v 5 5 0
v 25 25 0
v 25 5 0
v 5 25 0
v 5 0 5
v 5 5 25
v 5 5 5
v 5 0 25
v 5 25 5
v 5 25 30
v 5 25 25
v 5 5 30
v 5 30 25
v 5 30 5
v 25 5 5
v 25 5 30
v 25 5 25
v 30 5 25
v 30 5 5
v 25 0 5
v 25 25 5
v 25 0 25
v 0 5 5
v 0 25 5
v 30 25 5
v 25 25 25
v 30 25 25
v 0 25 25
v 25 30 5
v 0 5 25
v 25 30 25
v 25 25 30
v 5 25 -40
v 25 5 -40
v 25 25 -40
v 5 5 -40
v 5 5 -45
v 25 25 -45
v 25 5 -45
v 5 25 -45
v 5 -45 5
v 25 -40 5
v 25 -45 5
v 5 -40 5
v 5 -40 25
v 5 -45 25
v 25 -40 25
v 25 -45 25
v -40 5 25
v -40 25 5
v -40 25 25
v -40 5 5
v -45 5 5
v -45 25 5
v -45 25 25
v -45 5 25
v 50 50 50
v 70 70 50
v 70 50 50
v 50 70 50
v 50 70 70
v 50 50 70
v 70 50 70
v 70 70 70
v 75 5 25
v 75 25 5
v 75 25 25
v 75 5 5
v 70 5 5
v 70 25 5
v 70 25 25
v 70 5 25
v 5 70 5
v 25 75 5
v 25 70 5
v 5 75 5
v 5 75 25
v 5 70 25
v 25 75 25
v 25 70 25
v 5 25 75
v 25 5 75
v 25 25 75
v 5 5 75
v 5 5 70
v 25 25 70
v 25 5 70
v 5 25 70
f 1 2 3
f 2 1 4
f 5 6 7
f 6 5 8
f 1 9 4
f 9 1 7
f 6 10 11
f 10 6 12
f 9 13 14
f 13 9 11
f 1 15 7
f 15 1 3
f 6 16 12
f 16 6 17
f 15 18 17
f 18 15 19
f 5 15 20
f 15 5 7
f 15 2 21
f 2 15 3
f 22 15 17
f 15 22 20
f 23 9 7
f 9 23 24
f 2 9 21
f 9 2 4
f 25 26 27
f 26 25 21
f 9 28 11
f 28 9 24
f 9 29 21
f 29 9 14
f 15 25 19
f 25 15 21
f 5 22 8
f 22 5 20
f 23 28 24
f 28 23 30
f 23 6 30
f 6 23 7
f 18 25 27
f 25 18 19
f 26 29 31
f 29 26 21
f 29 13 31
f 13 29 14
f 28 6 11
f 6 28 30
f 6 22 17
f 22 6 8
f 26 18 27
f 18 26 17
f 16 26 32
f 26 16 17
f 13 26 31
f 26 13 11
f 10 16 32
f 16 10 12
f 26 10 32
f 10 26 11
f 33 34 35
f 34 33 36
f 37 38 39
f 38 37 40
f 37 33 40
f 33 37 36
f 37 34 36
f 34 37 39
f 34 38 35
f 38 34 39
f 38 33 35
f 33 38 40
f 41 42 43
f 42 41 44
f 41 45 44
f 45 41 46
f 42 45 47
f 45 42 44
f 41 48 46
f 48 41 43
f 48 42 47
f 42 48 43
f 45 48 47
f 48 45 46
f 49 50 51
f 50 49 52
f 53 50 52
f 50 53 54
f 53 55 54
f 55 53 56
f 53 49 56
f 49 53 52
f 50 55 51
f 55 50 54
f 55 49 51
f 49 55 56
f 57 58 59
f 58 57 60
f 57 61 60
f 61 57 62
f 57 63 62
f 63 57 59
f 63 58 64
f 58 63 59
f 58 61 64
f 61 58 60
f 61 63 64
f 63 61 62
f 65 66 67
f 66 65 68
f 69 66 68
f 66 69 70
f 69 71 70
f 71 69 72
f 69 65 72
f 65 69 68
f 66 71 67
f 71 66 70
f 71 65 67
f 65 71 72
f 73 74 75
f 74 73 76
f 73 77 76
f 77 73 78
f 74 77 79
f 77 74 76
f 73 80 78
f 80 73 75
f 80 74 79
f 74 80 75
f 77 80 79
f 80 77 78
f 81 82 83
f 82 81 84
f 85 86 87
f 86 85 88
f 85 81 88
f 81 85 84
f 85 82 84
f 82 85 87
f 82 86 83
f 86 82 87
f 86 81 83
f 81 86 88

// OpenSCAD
// SCAD file for Six Piece Burr Puzzle
// 整体模型
union() {
  translate([5, 5, 0]) color([1, 0.8, 0, 0.85]) cube([5, 5, 5]);
  translate([10, 5, 0]) color([1, 0.8, 0, 0.85]) cube([5, 5, 5]);
  translate([15, 5, 0]) color([1, 0.8, 0, 0.85]) cube([5, 5, 5]);
  translate([20, 5, 0]) color([1, 0.8, 0, 0.85]) cube([5, 5, 5]);
  translate([5, 10, 0]) color([1, 0.8, 0, 0.85]) cube([5, 5, 5]);
  translate([10, 10, 0]) color([1, 0.8, 0, 0.85]) cube([5, 5, 5]);
  translate([15, 10, 0]) color([1, 0.8, 0, 0.85]) cube([5, 5, 5]);
  translate([20, 10, 0]) color([1, 0.8, 0, 0.85]) cube([5, 5, 5]);
  translate([5, 15, 0]) color([1, 0.8, 0, 0.85]) cube([5, 5, 5]);
  translate([10, 15, 0]) color([1, 0.8, 0, 0.85]) cube([5, 5, 5]);
  translate([15, 15, 0]) color([1, 0.8, 0, 0.85]) cube([5, 5, 5]);
  translate([20, 15, 0]) color([1, 0.8, 0, 0.85]) cube([5, 5, 5]);
  translate([5, 20, 0]) color([1, 0.8, 0, 0.85]) cube([5, 5, 5]);
  translate([10, 20, 0]) color([1, 0.8, 0, 0.85]) cube([5, 5, 5]);
  translate([15, 20, 0]) color([1, 0.8, 0, 0.85]) cube([5, 5, 5]);
  translate([20, 20, 0]) color([1, 0.8, 0, 0.85]) cube([5, 5, 5]);
  translate([5, 0, 5]) color([0, 0.8, 0, 0.85]) cube([5, 5, 5]);
  translate([10, 0, 5]) color([0, 0.8, 0, 0.85]) cube([5, 5, 5]);
  translate([15, 0, 5]) color([0, 0.8, 0, 0.85]) cube([5, 5, 5]);
  translate([20, 0, 5]) color([0, 0.8, 0, 0.85]) cube([5, 5, 5]);
  translate([0, 5, 5]) color([0.6, 0, 1, 0.85]) cube([5, 5, 5]);
  translate([5, 5, 5]) color([0.8, 0.8, 0.8, 0.85]) cube([5, 5, 5]);
  translate([10, 5, 5]) color([0.8, 0.8, 0.8, 0.85]) cube([5, 5, 5]);
  translate([15, 5, 5]) color([0.8, 0.8, 0.8, 0.85]) cube([5, 5, 5]);
  translate([20, 5, 5]) color([0.8, 0.8, 0.8, 0.85]) cube([5, 5, 5]);
  translate([25, 5, 5]) color([1, 0.4, 0, 0.85]) cube([5, 5, 5]);
  translate([0, 10, 5]) color([0.6, 0, 1, 0.85]) cube([5, 5, 5]);
  translate([5, 10, 5]) color([0.8, 0.8, 0.8, 0.85]) cube([5, 5, 5]);
  translate([10, 10, 5]) color([0.8, 0.8, 0.8, 0.85]) cube([5, 5, 5]);
  translate([15, 10, 5]) color([0.8, 0.8, 0.8, 0.85]) cube([5, 5, 5]);
  translate([20, 10, 5]) color([0.8, 0.8, 0.8, 0.85]) cube([5, 5, 5]);
  translate([25, 10, 5]) color([1, 0.4, 0, 0.85]) cube([5, 5, 5]);
  translate([0, 15, 5]) color([0.6, 0, 1, 0.85]) cube([5, 5, 5]);
  translate([5, 15, 5]) color([0.8, 0.8, 0.8, 0.85]) cube([5, 5, 5]);
  translate([10, 15, 5]) color([0.8, 0.8, 0.8, 0.85]) cube([5, 5, 5]);
  translate([15, 15, 5]) color([0.8, 0.8, 0.8, 0.85]) cube([5, 5, 5]);
  translate([20, 15, 5]) color([0.8, 0.8, 0.8, 0.85]) cube([5, 5, 5]);
  translate([25, 15, 5]) color([1, 0.4, 0, 0.85]) cube([5, 5, 5]);
  translate([0, 20, 5]) color([0.6, 0, 1, 0.85]) cube([5, 5, 5]);
  translate([5, 20, 5]) color([0.8, 0.8, 0.8, 0.85]) cube([5, 5, 5]);
  translate([10, 20, 5]) color([0.8, 0.8, 0.8, 0.85]) cube([5, 5, 5]);
  translate([15, 20, 5]) color([0.8, 0.8, 0.8, 0.85]) cube([5, 5, 5]);
  translate([20, 20, 5]) color([0.8, 0.8, 0.8, 0.85]) cube([5, 5, 5]);
  translate([25, 20, 5]) color([1, 0.4, 0, 0.85]) cube([5, 5, 5]);
  translate([5, 25, 5]) color([1, 0, 0, 0.85]) cube([5, 5, 5]);
  translate([10, 25, 5]) color([1, 0, 0, 0.85]) cube([5, 5, 5]);
  translate([15, 25, 5]) color([1, 0, 0, 0.85]) cube([5, 5, 5]);
  translate([20, 25, 5]) color([1, 0, 0, 0.85]) cube([5, 5, 5]);
  translate([5, 0, 10]) color([0, 0.8, 0, 0.85]) cube([5, 5, 5]);
  translate([10, 0, 10]) color([0, 0.8, 0, 0.85]) cube([5, 5, 5]);
  translate([15, 0, 10]) color([0, 0.8, 0, 0.85]) cube([5, 5, 5]);
  translate([20, 0, 10]) color([0, 0.8, 0, 0.85]) cube([5, 5, 5]);
  translate([0, 5, 10]) color([0.6, 0, 1, 0.85]) cube([5, 5, 5]);
  translate([5, 5, 10]) color([0.8, 0.8, 0.8, 0.85]) cube([5, 5, 5]);
  translate([10, 5, 10]) color([0.8, 0.8, 0.8, 0.85]) cube([5, 5, 5]);
  translate([15, 5, 10]) color([0.8, 0.8, 0.8, 0.85]) cube([5, 5, 5]);
  translate([20, 5, 10]) color([0.8, 0.8, 0.8, 0.85]) cube([5, 5, 5]);
  translate([25, 5, 10]) color([1, 0.4, 0, 0.85]) cube([5, 5, 5]);
  translate([0, 10, 10]) color([0.6, 0, 1, 0.85]) cube([5, 5, 5]);
  translate([5, 10, 10]) color([0.8, 0.8, 0.8, 0.85]) cube([5, 5, 5]);
  translate([10, 10, 10]) color([0.8, 0.8, 0.8, 0.85]) cube([5, 5, 5]);
  translate([15, 10, 10]) color([0.8, 0.8, 0.8, 0.85]) cube([5, 5, 5]);
  translate([20, 10, 10]) color([0.8, 0.8, 0.8, 0.85]) cube([5, 5, 5]);
  translate([25, 10, 10]) color([1, 0.4, 0, 0.85]) cube([5, 5, 5]);
  translate([0, 15, 10]) color([0.6, 0, 1, 0.85]) cube([5, 5, 5]);
  translate([5, 15, 10]) color([0.8, 0.8, 0.8, 0.85]) cube([5, 5, 5]);
  translate([10, 15, 10]) color([0.8, 0.8, 0.8, 0.85]) cube([5, 5, 5]);
  translate([15, 15, 10]) color([0.8, 0.8, 0.8, 0.85]) cube([5, 5, 5]);
  translate([20, 15, 10]) color([0.8, 0.8, 0.8, 0.85]) cube([5, 5, 5]);
  translate([25, 15, 10]) color([1, 0.4, 0, 0.85]) cube([5, 5, 5]);
  translate([0, 20, 10]) color([0.6, 0, 1, 0.85]) cube([5, 5, 5]);
  translate([5, 20, 10]) color([0.8, 0.8, 0.8, 0.85]) cube([5, 5, 5]);
  translate([10, 20, 10]) color([0.8, 0.8, 0.8, 0.85]) cube([5, 5, 5]);
  translate([15, 20, 10]) color([0.8, 0.8, 0.8, 0.85]) cube([5, 5, 5]);
  translate([20, 20, 10]) color([0.8, 0.8, 0.8, 0.85]) cube([5, 5, 5]);
  translate([25, 20, 10]) color([1, 0.4, 0, 0.85]) cube([5, 5, 5]);
  translate([5, 25, 10]) color([1, 0, 0, 0.85]) cube([5, 5, 5]);
  translate([10, 25, 10]) color([1, 0, 0, 0.85]) cube([5, 5, 5]);
  translate([15, 25, 10]) color([1, 0, 0, 0.85]) cube([5, 5, 5]);
  translate([20, 25, 10]) color([1, 0, 0, 0.85]) cube([5, 5, 5]);
  translate([5, 0, 15]) color([0, 0.8, 0, 0.85]) cube([5, 5, 5]);
  translate([10, 0, 15]) color([0, 0.8, 0, 0.85]) cube([5, 5, 5]);
  translate([15, 0, 15]) color([0, 0.8, 0, 0.85]) cube([5, 5, 5]);
  translate([20, 0, 15]) color([0, 0.8, 0, 0.85]) cube([5, 5, 5]);
  translate([0, 5, 15]) color([0.6, 0, 1, 0.85]) cube([5, 5, 5]);
  translate([5, 5, 15]) color([0.8, 0.8, 0.8, 0.85]) cube([5, 5, 5]);
  translate([10, 5, 15]) color([0.8, 0.8, 0.8, 0.85]) cube([5, 5, 5]);
  translate([15, 5, 15]) color([0.8, 0.8, 0.8, 0.85]) cube([5, 5, 5]);
  translate([20, 5, 15]) color([0.8, 0.8, 0.8, 0.85]) cube([5, 5, 5]);
  translate([25, 5, 15]) color([1, 0.4, 0, 0.85]) cube([5, 5, 5]);
  translate([0, 10, 15]) color([0.6, 0, 1, 0.85]) cube([5, 5, 5]);
  translate([5, 10, 15]) color([0.8, 0.8, 0.8, 0.85]) cube([5, 5, 5]);
  translate([10, 10, 15]) color([0.8, 0.8, 0.8, 0.85]) cube([5, 5, 5]);
  translate([15, 10, 15]) color([0.8, 0.8, 0.8, 0.85]) cube([5, 5, 5]);
  translate([20, 10, 15]) color([0.8, 0.8, 0.8, 0.85]) cube([5, 5, 5]);
  translate([25, 10, 15]) color([1, 0.4, 0, 0.85]) cube([5, 5, 5]);
  translate([0, 15, 15]) color([0.6, 0, 1, 0.85]) cube([5, 5, 5]);
  translate([5, 15, 15]) color([0.8, 0.8, 0.8, 0.85]) cube([5, 5, 5]);
  translate([10, 15, 15]) color([0.8, 0.8, 0.8, 0.85]) cube([5, 5, 5]);
  translate([15, 15, 15]) color([0.8, 0.8, 0.8, 0.85]) cube([5, 5, 5]);
  translate([20, 15, 15]) color([0.8, 0.8, 0.8, 0.85]) cube([5, 5, 5]);
  translate([25, 15, 15]) color([1, 0.4, 0, 0.85]) cube([5, 5, 5]);
  translate([0, 20, 15]) color([0.6, 0, 1, 0.85]) cube([5, 5, 5]);
  translate([5, 20, 15]) color([0.8, 0.8, 0.8, 0.85]) cube([5, 5, 5]);
  translate([10, 20, 15]) color([0.8, 0.8, 0.8, 0.85]) cube([5, 5, 5]);
  translate([15, 20, 15]) color([0.8, 0.8, 0.8, 0.85]) cube([5, 5, 5]);
  translate([20, 20, 15]) color([0.8, 0.8, 0.8, 0.85]) cube([5, 5, 5]);
  translate([25, 20, 15]) color([1, 0.4, 0, 0.85]) cube([5, 5, 5]);
  translate([5, 25, 15]) color([1, 0, 0, 0.85]) cube([5, 5, 5]);
  translate([10, 25, 15]) color([1, 0, 0, 0.85]) cube([5, 5, 5]);
  translate([15, 25, 15]) color([1, 0, 0, 0.85]) cube([5, 5, 5]);
  translate([20, 25, 15]) color([1, 0, 0, 0.85]) cube([5, 5, 5]);
  translate([5, 0, 20]) color([0, 0.8, 0, 0.85]) cube([5, 5, 5]);
  translate([10, 0, 20]) color([0, 0.8, 0, 0.85]) cube([5, 5, 5]);
  translate([15, 0, 20]) color([0, 0.8, 0, 0.85]) cube([5, 5, 5]);
  translate([20, 0, 20]) color([0, 0.8, 0, 0.85]) cube([5, 5, 5]);
  translate([0, 5, 20]) color([0.6, 0, 1, 0.85]) cube([5, 5, 5]);
  translate([5, 5, 20]) color([0.8, 0.8, 0.8, 0.85]) cube([5, 5, 5]);
  translate([10, 5, 20]) color([0.8, 0.8, 0.8, 0.85]) cube([5, 5, 5]);
  translate([15, 5, 20]) color([0.8, 0.8, 0.8, 0.85]) cube([5, 5, 5]);
  translate([20, 5, 20]) color([0.8, 0.8, 0.8, 0.85]) cube([5, 5, 5]);
  translate([25, 5, 20]) color([1, 0.4, 0, 0.85]) cube([5, 5, 5]);
  translate([0, 10, 20]) color([0.6, 0, 1, 0.85]) cube([5, 5, 5]);
  translate([5, 10, 20]) color([0.8, 0.8, 0.8, 0.85]) cube([5, 5, 5]);
  translate([10, 10, 20]) color([0.8, 0.8, 0.8, 0.85]) cube([5, 5, 5]);
  translate([15, 10, 20]) color([0.8, 0.8, 0.8, 0.85]) cube([5, 5, 5]);
  translate([20, 10, 20]) color([0.8, 0.8, 0.8, 0.85]) cube([5, 5, 5]);
  translate([25, 10, 20]) color([1, 0.4, 0, 0.85]) cube([5, 5, 5]);
  translate([0, 15, 20]) color([0.6, 0, 1, 0.85]) cube([5, 5, 5]);
  translate([5, 15, 20]) color([0.8, 0.8, 0.8, 0.85]) cube([5, 5, 5]);
  translate([10, 15, 20]) color([0.8, 0.8, 0.8, 0.85]) cube([5, 5, 5]);
  translate([15, 15, 20]) color([0.8, 0.8, 0.8, 0.85]) cube([5, 5, 5]);
  translate([20, 15, 20]) color([0.8, 0.8, 0.8, 0.85]) cube([5, 5, 5]);
  translate([25, 15, 20]) color([1, 0.4, 0, 0.85]) cube([5, 5, 5]);
  translate([0, 20, 20]) color([0.6, 0, 1, 0.85]) cube([5, 5, 5]);
  translate([5, 20, 20]) color([0.8, 0.8, 0.8, 0.85]) cube([5, 5, 5]);
  translate([10, 20, 20]) color([0.8, 0.8, 0.8, 0.85]) cube([5, 5, 5]);
  translate([15, 20, 20]) color([0.8, 0.8, 0.8, 0.85]) cube([5, 5, 5]);
  translate([20, 20, 20]) color([0.8, 0.8, 0.8, 0.85]) cube([5, 5, 5]);
  translate([25, 20, 20]) color([1, 0.4, 0, 0.85]) cube([5, 5, 5]);
  translate([5, 25, 20]) color([1, 0, 0, 0.85]) cube([5, 5, 5]);
  translate([10, 25, 20]) color([1, 0, 0, 0.85]) cube([5, 5, 5]);
  translate([15, 25, 20]) color([1, 0, 0, 0.85]) cube([5, 5, 5]);
  translate([20, 25, 20]) color([1, 0, 0, 0.85]) cube([5, 5, 5]);
  translate([5, 5, 25]) color([0, 0.4, 1, 0.85]) cube([5, 5, 5]);
  translate([10, 5, 25]) color([0, 0.4, 1, 0.85]) cube([5, 5, 5]);
  translate([15, 5, 25]) color([0, 0.4, 1, 0.85]) cube([5, 5, 5]);
  translate([20, 5, 25]) color([0, 0.4, 1, 0.85]) cube([5, 5, 5]);
  translate([5, 10, 25]) color([0, 0.4, 1, 0.85]) cube([5, 5, 5]);
  translate([10, 10, 25]) color([0, 0.4, 1, 0.85]) cube([5, 5, 5]);
  translate([15, 10, 25]) color([0, 0.4, 1, 0.85]) cube([5, 5, 5]);
  translate([20, 10, 25]) color([0, 0.4, 1, 0.85]) cube([5, 5, 5]);
  translate([5, 15, 25]) color([0, 0.4, 1, 0.85]) cube([5, 5, 5]);
  translate([10, 15, 25]) color([0, 0.4, 1, 0.85]) cube([5, 5, 5]);
  translate([15, 15, 25]) color([0, 0.4, 1, 0.85]) cube([5, 5, 5]);
  translate([20, 15, 25]) color([0, 0.4, 1, 0.85]) cube([5, 5, 5]);
  translate([5, 20, 25]) color([0, 0.4, 1, 0.85]) cube([5, 5, 5]);
  translate([10, 20, 25]) color([0, 0.4, 1, 0.85]) cube([5, 5, 5]);
  translate([15, 20, 25]) color([0, 0.4, 1, 0.85]) cube([5, 5, 5]);
  translate([20, 20, 25]) color([0, 0.4, 1, 0.85]) cube([5, 5, 5]);
}

// 零件 D
union() {
  translate([5.0, 5.0, -45.0]) color([1, 0.8, 0, 0.85]) cube([5, 5, 5]);
  translate([10.0, 5.0, -45.0]) color([1, 0.8, 0, 0.85]) cube([5, 5, 5]);
  translate([15.0, 5.0, -45.0]) color([1, 0.8, 0, 0.85]) cube([5, 5, 5]);
  translate([20.0, 5.0, -45.0]) color([1, 0.8, 0, 0.85]) cube([5, 5, 5]);
  translate([5.0, 10.0, -45.0]) color([1, 0.8, 0, 0.85]) cube([5, 5, 5]);
  translate([10.0, 10.0, -45.0]) color([1, 0.8, 0, 0.85]) cube([5, 5, 5]);
  translate([15.0, 10.0, -45.0]) color([1, 0.8, 0, 0.85]) cube([5, 5, 5]);
  translate([20.0, 10.0, -45.0]) color([1, 0.8, 0, 0.85]) cube([5, 5, 5]);
  translate([5.0, 15.0, -45.0]) color([1, 0.8, 0, 0.85]) cube([5, 5, 5]);
  translate([10.0, 15.0, -45.0]) color([1, 0.8, 0, 0.85]) cube([5, 5, 5]);
  translate([15.0, 15.0, -45.0]) color([1, 0.8, 0, 0.85]) cube([5, 5, 5]);
  translate([20.0, 15.0, -45.0]) color([1, 0.8, 0, 0.85]) cube([5, 5, 5]);
  translate([5.0, 20.0, -45.0]) color([1, 0.8, 0, 0.85]) cube([5, 5, 5]);
  translate([10.0, 20.0, -45.0]) color([1, 0.8, 0, 0.85]) cube([5, 5, 5]);
  translate([15.0, 20.0, -45.0]) color([1, 0.8, 0, 0.85]) cube([5, 5, 5]);
  translate([20.0, 20.0, -45.0]) color([1, 0.8, 0, 0.85]) cube([5, 5, 5]);
}

// 零件 B
union() {
  translate([5.0, -45.0, 5.0]) color([0, 0.8, 0, 0.85]) cube([5, 5, 5]);
  translate([10.0, -45.0, 5.0]) color([0, 0.8, 0, 0.85]) cube([5, 5, 5]);
  translate([15.0, -45.0, 5.0]) color([0, 0.8, 0, 0.85]) cube([5, 5, 5]);
  translate([20.0, -45.0, 5.0]) color([0, 0.8, 0, 0.85]) cube([5, 5, 5]);
  translate([5.0, -45.0, 10.0]) color([0, 0.8, 0, 0.85]) cube([5, 5, 5]);
  translate([10.0, -45.0, 10.0]) color([0, 0.8, 0, 0.85]) cube([5, 5, 5]);
  translate([15.0, -45.0, 10.0]) color([0, 0.8, 0, 0.85]) cube([5, 5, 5]);
  translate([20.0, -45.0, 10.0]) color([0, 0.8, 0, 0.85]) cube([5, 5, 5]);
  translate([5.0, -45.0, 15.0]) color([0, 0.8, 0, 0.85]) cube([5, 5, 5]);
  translate([10.0, -45.0, 15.0]) color([0, 0.8, 0, 0.85]) cube([5, 5, 5]);
  translate([15.0, -45.0, 15.0]) color([0, 0.8, 0, 0.85]) cube([5, 5, 5]);
  translate([20.0, -45.0, 15.0]) color([0, 0.8, 0, 0.85]) cube([5, 5, 5]);
  translate([5.0, -45.0, 20.0]) color([0, 0.8, 0, 0.85]) cube([5, 5, 5]);
  translate([10.0, -45.0, 20.0]) color([0, 0.8, 0, 0.85]) cube([5, 5, 5]);
  translate([15.0, -45.0, 20.0]) color([0, 0.8, 0, 0.85]) cube([5, 5, 5]);
  translate([20.0, -45.0, 20.0]) color([0, 0.8, 0, 0.85]) cube([5, 5, 5]);
}

// 零件 F
union() {
  translate([-45.0, 5.0, 5.0]) color([0.6, 0, 1, 0.85]) cube([5, 5, 5]);
  translate([-45.0, 10.0, 5.0]) color([0.6, 0, 1, 0.85]) cube([5, 5, 5]);
  translate([-45.0, 15.0, 5.0]) color([0.6, 0, 1, 0.85]) cube([5, 5, 5]);
  translate([-45.0, 20.0, 5.0]) color([0.6, 0, 1, 0.85]) cube([5, 5, 5]);
  translate([-45.0, 5.0, 10.0]) color([0.6, 0, 1, 0.85]) cube([5, 5, 5]);
  translate([-45.0, 10.0, 10.0]) color([0.6, 0, 1, 0.85]) cube([5, 5, 5]);
  translate([-45.0, 15.0, 10.0]) color([0.6, 0, 1, 0.85]) cube([5, 5, 5]);
  translate([-45.0, 20.0, 10.0]) color([0.6, 0, 1, 0.85]) cube([5, 5, 5]);
  translate([-45.0, 5.0, 15.0]) color([0.6, 0, 1, 0.85]) cube([5, 5, 5]);
  translate([-45.0, 10.0, 15.0]) color([0.6, 0, 1, 0.85]) cube([5, 5, 5]);
  translate([-45.0, 15.0, 15.0]) color([0.6, 0, 1, 0.85]) cube([5, 5, 5]);
  translate([-45.0, 20.0, 15.0]) color([0.6, 0, 1, 0.85]) cube([5, 5, 5]);
  translate([-45.0, 5.0, 20.0]) color([0.6, 0, 1, 0.85]) cube([5, 5, 5]);
  translate([-45.0, 10.0, 20.0]) color([0.6, 0, 1, 0.85]) cube([5, 5, 5]);
  translate([-45.0, 15.0, 20.0]) color([0.6, 0, 1, 0.85]) cube([5, 5, 5]);
  translate([-45.0, 20.0, 20.0]) color([0.6, 0, 1, 0.85]) cube([5, 5, 5]);
}

// 零件 public
union() {
  translate([50.0, 50.0, 50.0]) color([0.8, 0.8, 0.8, 0.85]) cube([5, 5, 5]);
  translate([55.0, 50.0, 50.0]) color([0.8, 0.8, 0.8, 0.85]) cube([5, 5, 5]);
  translate([60.0, 50.0, 50.0]) color([0.8, 0.8, 0.8, 0.85]) cube([5, 5, 5]);
  translate([65.0, 50.0, 50.0]) color([0.8, 0.8, 0.8, 0.85]) cube([5, 5, 5]);
  translate([50.0, 55.0, 50.0]) color([0.8, 0.8, 0.8, 0.85]) cube([5, 5, 5]);
  translate([55.0, 55.0, 50.0]) color([0.8, 0.8, 0.8, 0.85]) cube([5, 5, 5]);
  translate([60.0, 55.0, 50.0]) color([0.8, 0.8, 0.8, 0.85]) cube([5, 5, 5]);
  translate([65.0, 55.0, 50.0]) color([0.8, 0.8, 0.8, 0.85]) cube([5, 5, 5]);
  translate([50.0, 60.0, 50.0]) color([0.8, 0.8, 0.8, 0.85]) cube([5, 5, 5]);
  translate([55.0, 60.0, 50.0]) color([0.8, 0.8, 0.8, 0.85]) cube([5, 5, 5]);
  translate([60.0, 60.0, 50.0]) color([0.8, 0.8, 0.8, 0.85]) cube([5, 5, 5]);
  translate([65.0, 60.0, 50.0]) color([0.8, 0.8, 0.8, 0.85]) cube([5, 5, 5]);
  translate([50.0, 65.0, 50.0]) color([0.8, 0.8, 0.8, 0.85]) cube([5, 5, 5]);
  translate([55.0, 65.0, 50.0]) color([0.8, 0.8, 0.8, 0.85]) cube([5, 5, 5]);
  translate([60.0, 65.0, 50.0]) color([0.8, 0.8, 0.8, 0.85]) cube([5, 5, 5]);
  translate([65.0, 65.0, 50.0]) color([0.8, 0.8, 0.8, 0.85]) cube([5, 5, 5]);
  translate([50.0, 50.0, 55.0]) color([0.8, 0.8, 0.8, 0.85]) cube([5, 5, 5]);
  translate([55.0, 50.0, 55.0]) color([0.8, 0.8, 0.8, 0.85]) cube([5, 5, 5]);
  translate([60.0, 50.0, 55.0]) color([0.8, 0.8, 0.8, 0.85]) cube([5, 5, 5]);
  translate([65.0, 50.0, 55.0]) color([0.8, 0.8, 0.8, 0.85]) cube([5, 5, 5]);
  translate([50.0, 55.0, 55.0]) color([0.8, 0.8, 0.8, 0.85]) cube([5, 5, 5]);
  translate([55.0, 55.0, 55.0]) color([0.8, 0.8, 0.8, 0.85]) cube([5, 5, 5]);
  translate([60.0, 55.0, 55.0]) color([0.8, 0.8, 0.8, 0.85]) cube([5, 5, 5]);
  translate([65.0, 55.0, 55.0]) color([0.8, 0.8, 0.8, 0.85]) cube([5, 5, 5]);
  translate([50.0, 60.0, 55.0]) color([0.8, 0.8, 0.8, 0.85]) cube([5, 5, 5]);
  translate([55.0, 60.0, 55.0]) color([0.8, 0.8, 0.8, 0.85]) cube([5, 5, 5]);
  translate([60.0, 60.0, 55.0]) color([0.8, 0.8, 0.8, 0.85]) cube([5, 5, 5]);
  translate([65.0, 60.0, 55.0]) color([0.8, 0.8, 0.8, 0.85]) cube([5, 5, 5]);
  translate([50.0, 65.0, 55.0]) color([0.8, 0.8, 0.8, 0.85]) cube([5, 5, 5]);
  translate([55.0, 65.0, 55.0]) color([0.8, 0.8, 0.8, 0.85]) cube([5, 5, 5]);
  translate([60.0, 65.0, 55.0]) color([0.8, 0.8, 0.8, 0.85]) cube([5, 5, 5]);
  translate([65.0, 65.0, 55.0]) color([0.8, 0.8, 0.8, 0.85]) cube([5, 5, 5]);
  translate([50.0, 50.0, 60.0]) color([0.8, 0.8, 0.8, 0.85]) cube([5, 5, 5]);
  translate([55.0, 50.0, 60.0]) color([0.8, 0.8, 0.8, 0.85]) cube([5, 5, 5]);
  translate([60.0, 50.0, 60.0]) color([0.8, 0.8, 0.8, 0.85]) cube([5, 5, 5]);
  translate([65.0, 50.0, 60.0]) color([0.8, 0.8, 0.8, 0.85]) cube([5, 5, 5]);
  translate([50.0, 55.0, 60.0]) color([0.8, 0.8, 0.8, 0.85]) cube([5, 5, 5]);
  translate([55.0, 55.0, 60.0]) color([0.8, 0.8, 0.8, 0.85]) cube([5, 5, 5]);
  translate([60.0, 55.0, 60.0]) color([0.8, 0.8, 0.8, 0.85]) cube([5, 5, 5]);
  translate([65.0, 55.0, 60.0]) color([0.8, 0.8, 0.8, 0.85]) cube([5, 5, 5]);
  translate([50.0, 60.0, 60.0]) color([0.8, 0.8, 0.8, 0.85]) cube([5, 5, 5]);
  translate([55.0, 60.0, 60.0]) color([0.8, 0.8, 0.8, 0.85]) cube([5, 5, 5]);
  translate([60.0, 60.0, 60.0]) color([0.8, 0.8, 0.8, 0.85]) cube([5, 5, 5]);
  translate([65.0, 60.0, 60.0]) color([0.8, 0.8, 0.8, 0.85]) cube([5, 5, 5]);
  translate([50.0, 65.0, 60.0]) color([0.8, 0.8, 0.8, 0.85]) cube([5, 5, 5]);
  translate([55.0, 65.0, 60.0]) color([0.8, 0.8, 0.8, 0.85]) cube([5, 5, 5]);
  translate([60.0, 65.0, 60.0]) color([0.8, 0.8, 0.8, 0.85]) cube([5, 5, 5]);
  translate([65.0, 65.0, 60.0]) color([0.8, 0.8, 0.8, 0.85]) cube([5, 5, 5]);
  translate([50.0, 50.0, 65.0]) color([0.8, 0.8, 0.8, 0.85]) cube([5, 5, 5]);
  translate([55.0, 50.0, 65.0]) color([0.8, 0.8, 0.8, 0.85]) cube([5, 5, 5]);
  translate([60.0, 50.0, 65.0]) color([0.8, 0.8, 0.8, 0.85]) cube([5, 5, 5]);
  translate([65.0, 50.0, 65.0]) color([0.8, 0.8, 0.8, 0.85]) cube([5, 5, 5]);
  translate([50.0, 55.0, 65.0]) color([0.8, 0.8, 0.8, 0.85]) cube([5, 5, 5]);
  translate([55.0, 55.0, 65.0]) color([0.8, 0.8, 0.8, 0.85]) cube([5, 5, 5]);
  translate([60.0, 55.0, 65.0]) color([0.8, 0.8, 0.8, 0.85]) cube([5, 5, 5]);
  translate([65.0, 55.0, 65.0]) color([0.8, 0.8, 0.8, 0.85]) cube([5, 5, 5]);
  translate([50.0, 60.0, 65.0]) color([0.8, 0.8, 0.8, 0.85]) cube([5, 5, 5]);
  translate([55.0, 60.0, 65.0]) color([0.8, 0.8, 0.8, 0.85]) cube([5, 5, 5]);
  translate([60.0, 60.0, 65.0]) color([0.8, 0.8, 0.8, 0.85]) cube([5, 5, 5]);
  translate([65.0, 60.0, 65.0]) color([0.8, 0.8, 0.8, 0.85]) cube([5, 5, 5]);
  translate([50.0, 65.0, 65.0]) color([0.8, 0.8, 0.8, 0.85]) cube([5, 5, 5]);
  translate([55.0, 65.0, 65.0]) color([0.8, 0.8, 0.8, 0.85]) cube([5, 5, 5]);
  translate([60.0, 65.0, 65.0]) color([0.8, 0.8, 0.8, 0.85]) cube([5, 5, 5]);
  translate([65.0, 65.0, 65.0]) color([0.8, 0.8, 0.8, 0.85]) cube([5, 5, 5]);
}

// 零件 E
union() {
  translate([70.0, 5.0, 5.0]) color([1, 0.4, 0, 0.85]) cube([5, 5, 5]);
  translate([70.0, 10.0, 5.0]) color([1, 0.4, 0, 0.85]) cube([5, 5, 5]);
  translate([70.0, 15.0, 5.0]) color([1, 0.4, 0, 0.85]) cube([5, 5, 5]);
  translate([70.0, 20.0, 5.0]) color([1, 0.4, 0, 0.85]) cube([5, 5, 5]);
  translate([70.0, 5.0, 10.0]) color([1, 0.4, 0, 0.85]) cube([5, 5, 5]);
  translate([70.0, 10.0, 10.0]) color([1, 0.4, 0, 0.85]) cube([5, 5, 5]);
  translate([70.0, 15.0, 10.0]) color([1, 0.4, 0, 0.85]) cube([5, 5, 5]);
  translate([70.0, 20.0, 10.0]) color([1, 0.4, 0, 0.85]) cube([5, 5, 5]);
  translate([70.0, 5.0, 15.0]) color([1, 0.4, 0, 0.85]) cube([5, 5, 5]);
  translate([70.0, 10.0, 15.0]) color([1, 0.4, 0, 0.85]) cube([5, 5, 5]);
  translate([70.0, 15.0, 15.0]) color([1, 0.4, 0, 0.85]) cube([5, 5, 5]);
  translate([70.0, 20.0, 15.0]) color([1, 0.4, 0, 0.85]) cube([5, 5, 5]);
  translate([70.0, 5.0, 20.0]) color([1, 0.4, 0, 0.85]) cube([5, 5, 5]);
  translate([70.0, 10.0, 20.0]) color([1, 0.4, 0, 0.85]) cube([5, 5, 5]);
  translate([70.0, 15.0, 20.0]) color([1, 0.4, 0, 0.85]) cube([5, 5, 5]);
  translate([70.0, 20.0, 20.0]) color([1, 0.4, 0, 0.85]) cube([5, 5, 5]);
}

// 零件 A
union() {
  translate([5.0, 70.0, 5.0]) color([1, 0, 0, 0.85]) cube([5, 5, 5]);
  translate([10.0, 70.0, 5.0]) color([1, 0, 0, 0.85]) cube([5, 5, 5]);
  translate([15.0, 70.0, 5.0]) color([1, 0, 0, 0.85]) cube([5, 5, 5]);
  translate([20.0, 70.0, 5.0]) color([1, 0, 0, 0.85]) cube([5, 5, 5]);
  translate([5.0, 70.0, 10.0]) color([1, 0, 0, 0.85]) cube([5, 5, 5]);
  translate([10.0, 70.0, 10.0]) color([1, 0, 0, 0.85]) cube([5, 5, 5]);
  translate([15.0, 70.0, 10.0]) color([1, 0, 0, 0.85]) cube([5, 5, 5]);
  translate([20.0, 70.0, 10.0]) color([1, 0, 0, 0.85]) cube([5, 5, 5]);
  translate([5.0, 70.0, 15.0]) color([1, 0, 0, 0.85]) cube([5, 5, 5]);
  translate([10.0, 70.0, 15.0]) color([1, 0, 0, 0.85]) cube([5, 5, 5]);
  translate([15.0, 70.0, 15.0]) color([1, 0, 0, 0.85]) cube([5, 5, 5]);
  translate([20.0, 70.0, 15.0]) color([1, 0, 0, 0.85]) cube([5, 5, 5]);
  translate([5.0, 70.0, 20.0]) color([1, 0, 0, 0.85]) cube([5, 5, 5]);
  translate([10.0, 70.0, 20.0]) color([1, 0, 0, 0.85]) cube([5, 5, 5]);
  translate([15.0, 70.0, 20.0]) color([1, 0, 0, 0.85]) cube([5, 5, 5]);
  translate([20.0, 70.0, 20.0]) color([1, 0, 0, 0.85]) cube([5, 5, 5]);
}

// 零件 C
union() {
  translate([5.0, 5.0, 70.0]) color([0, 0.4, 1, 0.85]) cube([5, 5, 5]);
  translate([10.0, 5.0, 70.0]) color([0, 0.4, 1, 0.85]) cube([5, 5, 5]);
  translate([15.0, 5.0, 70.0]) color([0, 0.4, 1, 0.85]) cube([5, 5, 5]);
  translate([20.0, 5.0, 70.0]) color([0, 0.4, 1, 0.85]) cube([5, 5, 5]);
  translate([5.0, 10.0, 70.0]) color([0, 0.4, 1, 0.85]) cube([5, 5, 5]);
  translate([10.0, 10.0, 70.0]) color([0, 0.4, 1, 0.85]) cube([5, 5, 5]);
  translate([15.0, 10.0, 70.0]) color([0, 0.4, 1, 0.85]) cube([5, 5, 5]);
  translate([20.0, 10.0, 70.0]) color([0, 0.4, 1, 0.85]) cube([5, 5, 5]);
  translate([5.0, 15.0, 70.0]) color([0, 0.4, 1, 0.85]) cube([5, 5, 5]);
  translate([10.0, 15.0, 70.0]) color([0, 0.4, 1, 0.85]) cube([5, 5, 5]);
  translate([15.0, 15.0, 70.0]) color([0, 0.4, 1, 0.85]) cube([5, 5, 5]);
  translate([20.0, 15.0, 70.0]) color([0, 0.4, 1, 0.85]) cube([5, 5, 5]);
  translate([5.0, 20.0, 70.0]) color([0, 0.4, 1, 0.85]) cube([5, 5, 5]);
  translate([10.0, 20.0, 70.0]) color([0, 0.4, 1, 0.85]) cube([5, 5, 5]);
  translate([15.0, 20.0, 70.0]) color([0, 0.4, 1, 0.85]) cube([5, 5, 5]);
  translate([20.0, 20.0, 70.0]) color([0, 0.4, 1, 0.85]) cube([5, 5, 5]);
}
